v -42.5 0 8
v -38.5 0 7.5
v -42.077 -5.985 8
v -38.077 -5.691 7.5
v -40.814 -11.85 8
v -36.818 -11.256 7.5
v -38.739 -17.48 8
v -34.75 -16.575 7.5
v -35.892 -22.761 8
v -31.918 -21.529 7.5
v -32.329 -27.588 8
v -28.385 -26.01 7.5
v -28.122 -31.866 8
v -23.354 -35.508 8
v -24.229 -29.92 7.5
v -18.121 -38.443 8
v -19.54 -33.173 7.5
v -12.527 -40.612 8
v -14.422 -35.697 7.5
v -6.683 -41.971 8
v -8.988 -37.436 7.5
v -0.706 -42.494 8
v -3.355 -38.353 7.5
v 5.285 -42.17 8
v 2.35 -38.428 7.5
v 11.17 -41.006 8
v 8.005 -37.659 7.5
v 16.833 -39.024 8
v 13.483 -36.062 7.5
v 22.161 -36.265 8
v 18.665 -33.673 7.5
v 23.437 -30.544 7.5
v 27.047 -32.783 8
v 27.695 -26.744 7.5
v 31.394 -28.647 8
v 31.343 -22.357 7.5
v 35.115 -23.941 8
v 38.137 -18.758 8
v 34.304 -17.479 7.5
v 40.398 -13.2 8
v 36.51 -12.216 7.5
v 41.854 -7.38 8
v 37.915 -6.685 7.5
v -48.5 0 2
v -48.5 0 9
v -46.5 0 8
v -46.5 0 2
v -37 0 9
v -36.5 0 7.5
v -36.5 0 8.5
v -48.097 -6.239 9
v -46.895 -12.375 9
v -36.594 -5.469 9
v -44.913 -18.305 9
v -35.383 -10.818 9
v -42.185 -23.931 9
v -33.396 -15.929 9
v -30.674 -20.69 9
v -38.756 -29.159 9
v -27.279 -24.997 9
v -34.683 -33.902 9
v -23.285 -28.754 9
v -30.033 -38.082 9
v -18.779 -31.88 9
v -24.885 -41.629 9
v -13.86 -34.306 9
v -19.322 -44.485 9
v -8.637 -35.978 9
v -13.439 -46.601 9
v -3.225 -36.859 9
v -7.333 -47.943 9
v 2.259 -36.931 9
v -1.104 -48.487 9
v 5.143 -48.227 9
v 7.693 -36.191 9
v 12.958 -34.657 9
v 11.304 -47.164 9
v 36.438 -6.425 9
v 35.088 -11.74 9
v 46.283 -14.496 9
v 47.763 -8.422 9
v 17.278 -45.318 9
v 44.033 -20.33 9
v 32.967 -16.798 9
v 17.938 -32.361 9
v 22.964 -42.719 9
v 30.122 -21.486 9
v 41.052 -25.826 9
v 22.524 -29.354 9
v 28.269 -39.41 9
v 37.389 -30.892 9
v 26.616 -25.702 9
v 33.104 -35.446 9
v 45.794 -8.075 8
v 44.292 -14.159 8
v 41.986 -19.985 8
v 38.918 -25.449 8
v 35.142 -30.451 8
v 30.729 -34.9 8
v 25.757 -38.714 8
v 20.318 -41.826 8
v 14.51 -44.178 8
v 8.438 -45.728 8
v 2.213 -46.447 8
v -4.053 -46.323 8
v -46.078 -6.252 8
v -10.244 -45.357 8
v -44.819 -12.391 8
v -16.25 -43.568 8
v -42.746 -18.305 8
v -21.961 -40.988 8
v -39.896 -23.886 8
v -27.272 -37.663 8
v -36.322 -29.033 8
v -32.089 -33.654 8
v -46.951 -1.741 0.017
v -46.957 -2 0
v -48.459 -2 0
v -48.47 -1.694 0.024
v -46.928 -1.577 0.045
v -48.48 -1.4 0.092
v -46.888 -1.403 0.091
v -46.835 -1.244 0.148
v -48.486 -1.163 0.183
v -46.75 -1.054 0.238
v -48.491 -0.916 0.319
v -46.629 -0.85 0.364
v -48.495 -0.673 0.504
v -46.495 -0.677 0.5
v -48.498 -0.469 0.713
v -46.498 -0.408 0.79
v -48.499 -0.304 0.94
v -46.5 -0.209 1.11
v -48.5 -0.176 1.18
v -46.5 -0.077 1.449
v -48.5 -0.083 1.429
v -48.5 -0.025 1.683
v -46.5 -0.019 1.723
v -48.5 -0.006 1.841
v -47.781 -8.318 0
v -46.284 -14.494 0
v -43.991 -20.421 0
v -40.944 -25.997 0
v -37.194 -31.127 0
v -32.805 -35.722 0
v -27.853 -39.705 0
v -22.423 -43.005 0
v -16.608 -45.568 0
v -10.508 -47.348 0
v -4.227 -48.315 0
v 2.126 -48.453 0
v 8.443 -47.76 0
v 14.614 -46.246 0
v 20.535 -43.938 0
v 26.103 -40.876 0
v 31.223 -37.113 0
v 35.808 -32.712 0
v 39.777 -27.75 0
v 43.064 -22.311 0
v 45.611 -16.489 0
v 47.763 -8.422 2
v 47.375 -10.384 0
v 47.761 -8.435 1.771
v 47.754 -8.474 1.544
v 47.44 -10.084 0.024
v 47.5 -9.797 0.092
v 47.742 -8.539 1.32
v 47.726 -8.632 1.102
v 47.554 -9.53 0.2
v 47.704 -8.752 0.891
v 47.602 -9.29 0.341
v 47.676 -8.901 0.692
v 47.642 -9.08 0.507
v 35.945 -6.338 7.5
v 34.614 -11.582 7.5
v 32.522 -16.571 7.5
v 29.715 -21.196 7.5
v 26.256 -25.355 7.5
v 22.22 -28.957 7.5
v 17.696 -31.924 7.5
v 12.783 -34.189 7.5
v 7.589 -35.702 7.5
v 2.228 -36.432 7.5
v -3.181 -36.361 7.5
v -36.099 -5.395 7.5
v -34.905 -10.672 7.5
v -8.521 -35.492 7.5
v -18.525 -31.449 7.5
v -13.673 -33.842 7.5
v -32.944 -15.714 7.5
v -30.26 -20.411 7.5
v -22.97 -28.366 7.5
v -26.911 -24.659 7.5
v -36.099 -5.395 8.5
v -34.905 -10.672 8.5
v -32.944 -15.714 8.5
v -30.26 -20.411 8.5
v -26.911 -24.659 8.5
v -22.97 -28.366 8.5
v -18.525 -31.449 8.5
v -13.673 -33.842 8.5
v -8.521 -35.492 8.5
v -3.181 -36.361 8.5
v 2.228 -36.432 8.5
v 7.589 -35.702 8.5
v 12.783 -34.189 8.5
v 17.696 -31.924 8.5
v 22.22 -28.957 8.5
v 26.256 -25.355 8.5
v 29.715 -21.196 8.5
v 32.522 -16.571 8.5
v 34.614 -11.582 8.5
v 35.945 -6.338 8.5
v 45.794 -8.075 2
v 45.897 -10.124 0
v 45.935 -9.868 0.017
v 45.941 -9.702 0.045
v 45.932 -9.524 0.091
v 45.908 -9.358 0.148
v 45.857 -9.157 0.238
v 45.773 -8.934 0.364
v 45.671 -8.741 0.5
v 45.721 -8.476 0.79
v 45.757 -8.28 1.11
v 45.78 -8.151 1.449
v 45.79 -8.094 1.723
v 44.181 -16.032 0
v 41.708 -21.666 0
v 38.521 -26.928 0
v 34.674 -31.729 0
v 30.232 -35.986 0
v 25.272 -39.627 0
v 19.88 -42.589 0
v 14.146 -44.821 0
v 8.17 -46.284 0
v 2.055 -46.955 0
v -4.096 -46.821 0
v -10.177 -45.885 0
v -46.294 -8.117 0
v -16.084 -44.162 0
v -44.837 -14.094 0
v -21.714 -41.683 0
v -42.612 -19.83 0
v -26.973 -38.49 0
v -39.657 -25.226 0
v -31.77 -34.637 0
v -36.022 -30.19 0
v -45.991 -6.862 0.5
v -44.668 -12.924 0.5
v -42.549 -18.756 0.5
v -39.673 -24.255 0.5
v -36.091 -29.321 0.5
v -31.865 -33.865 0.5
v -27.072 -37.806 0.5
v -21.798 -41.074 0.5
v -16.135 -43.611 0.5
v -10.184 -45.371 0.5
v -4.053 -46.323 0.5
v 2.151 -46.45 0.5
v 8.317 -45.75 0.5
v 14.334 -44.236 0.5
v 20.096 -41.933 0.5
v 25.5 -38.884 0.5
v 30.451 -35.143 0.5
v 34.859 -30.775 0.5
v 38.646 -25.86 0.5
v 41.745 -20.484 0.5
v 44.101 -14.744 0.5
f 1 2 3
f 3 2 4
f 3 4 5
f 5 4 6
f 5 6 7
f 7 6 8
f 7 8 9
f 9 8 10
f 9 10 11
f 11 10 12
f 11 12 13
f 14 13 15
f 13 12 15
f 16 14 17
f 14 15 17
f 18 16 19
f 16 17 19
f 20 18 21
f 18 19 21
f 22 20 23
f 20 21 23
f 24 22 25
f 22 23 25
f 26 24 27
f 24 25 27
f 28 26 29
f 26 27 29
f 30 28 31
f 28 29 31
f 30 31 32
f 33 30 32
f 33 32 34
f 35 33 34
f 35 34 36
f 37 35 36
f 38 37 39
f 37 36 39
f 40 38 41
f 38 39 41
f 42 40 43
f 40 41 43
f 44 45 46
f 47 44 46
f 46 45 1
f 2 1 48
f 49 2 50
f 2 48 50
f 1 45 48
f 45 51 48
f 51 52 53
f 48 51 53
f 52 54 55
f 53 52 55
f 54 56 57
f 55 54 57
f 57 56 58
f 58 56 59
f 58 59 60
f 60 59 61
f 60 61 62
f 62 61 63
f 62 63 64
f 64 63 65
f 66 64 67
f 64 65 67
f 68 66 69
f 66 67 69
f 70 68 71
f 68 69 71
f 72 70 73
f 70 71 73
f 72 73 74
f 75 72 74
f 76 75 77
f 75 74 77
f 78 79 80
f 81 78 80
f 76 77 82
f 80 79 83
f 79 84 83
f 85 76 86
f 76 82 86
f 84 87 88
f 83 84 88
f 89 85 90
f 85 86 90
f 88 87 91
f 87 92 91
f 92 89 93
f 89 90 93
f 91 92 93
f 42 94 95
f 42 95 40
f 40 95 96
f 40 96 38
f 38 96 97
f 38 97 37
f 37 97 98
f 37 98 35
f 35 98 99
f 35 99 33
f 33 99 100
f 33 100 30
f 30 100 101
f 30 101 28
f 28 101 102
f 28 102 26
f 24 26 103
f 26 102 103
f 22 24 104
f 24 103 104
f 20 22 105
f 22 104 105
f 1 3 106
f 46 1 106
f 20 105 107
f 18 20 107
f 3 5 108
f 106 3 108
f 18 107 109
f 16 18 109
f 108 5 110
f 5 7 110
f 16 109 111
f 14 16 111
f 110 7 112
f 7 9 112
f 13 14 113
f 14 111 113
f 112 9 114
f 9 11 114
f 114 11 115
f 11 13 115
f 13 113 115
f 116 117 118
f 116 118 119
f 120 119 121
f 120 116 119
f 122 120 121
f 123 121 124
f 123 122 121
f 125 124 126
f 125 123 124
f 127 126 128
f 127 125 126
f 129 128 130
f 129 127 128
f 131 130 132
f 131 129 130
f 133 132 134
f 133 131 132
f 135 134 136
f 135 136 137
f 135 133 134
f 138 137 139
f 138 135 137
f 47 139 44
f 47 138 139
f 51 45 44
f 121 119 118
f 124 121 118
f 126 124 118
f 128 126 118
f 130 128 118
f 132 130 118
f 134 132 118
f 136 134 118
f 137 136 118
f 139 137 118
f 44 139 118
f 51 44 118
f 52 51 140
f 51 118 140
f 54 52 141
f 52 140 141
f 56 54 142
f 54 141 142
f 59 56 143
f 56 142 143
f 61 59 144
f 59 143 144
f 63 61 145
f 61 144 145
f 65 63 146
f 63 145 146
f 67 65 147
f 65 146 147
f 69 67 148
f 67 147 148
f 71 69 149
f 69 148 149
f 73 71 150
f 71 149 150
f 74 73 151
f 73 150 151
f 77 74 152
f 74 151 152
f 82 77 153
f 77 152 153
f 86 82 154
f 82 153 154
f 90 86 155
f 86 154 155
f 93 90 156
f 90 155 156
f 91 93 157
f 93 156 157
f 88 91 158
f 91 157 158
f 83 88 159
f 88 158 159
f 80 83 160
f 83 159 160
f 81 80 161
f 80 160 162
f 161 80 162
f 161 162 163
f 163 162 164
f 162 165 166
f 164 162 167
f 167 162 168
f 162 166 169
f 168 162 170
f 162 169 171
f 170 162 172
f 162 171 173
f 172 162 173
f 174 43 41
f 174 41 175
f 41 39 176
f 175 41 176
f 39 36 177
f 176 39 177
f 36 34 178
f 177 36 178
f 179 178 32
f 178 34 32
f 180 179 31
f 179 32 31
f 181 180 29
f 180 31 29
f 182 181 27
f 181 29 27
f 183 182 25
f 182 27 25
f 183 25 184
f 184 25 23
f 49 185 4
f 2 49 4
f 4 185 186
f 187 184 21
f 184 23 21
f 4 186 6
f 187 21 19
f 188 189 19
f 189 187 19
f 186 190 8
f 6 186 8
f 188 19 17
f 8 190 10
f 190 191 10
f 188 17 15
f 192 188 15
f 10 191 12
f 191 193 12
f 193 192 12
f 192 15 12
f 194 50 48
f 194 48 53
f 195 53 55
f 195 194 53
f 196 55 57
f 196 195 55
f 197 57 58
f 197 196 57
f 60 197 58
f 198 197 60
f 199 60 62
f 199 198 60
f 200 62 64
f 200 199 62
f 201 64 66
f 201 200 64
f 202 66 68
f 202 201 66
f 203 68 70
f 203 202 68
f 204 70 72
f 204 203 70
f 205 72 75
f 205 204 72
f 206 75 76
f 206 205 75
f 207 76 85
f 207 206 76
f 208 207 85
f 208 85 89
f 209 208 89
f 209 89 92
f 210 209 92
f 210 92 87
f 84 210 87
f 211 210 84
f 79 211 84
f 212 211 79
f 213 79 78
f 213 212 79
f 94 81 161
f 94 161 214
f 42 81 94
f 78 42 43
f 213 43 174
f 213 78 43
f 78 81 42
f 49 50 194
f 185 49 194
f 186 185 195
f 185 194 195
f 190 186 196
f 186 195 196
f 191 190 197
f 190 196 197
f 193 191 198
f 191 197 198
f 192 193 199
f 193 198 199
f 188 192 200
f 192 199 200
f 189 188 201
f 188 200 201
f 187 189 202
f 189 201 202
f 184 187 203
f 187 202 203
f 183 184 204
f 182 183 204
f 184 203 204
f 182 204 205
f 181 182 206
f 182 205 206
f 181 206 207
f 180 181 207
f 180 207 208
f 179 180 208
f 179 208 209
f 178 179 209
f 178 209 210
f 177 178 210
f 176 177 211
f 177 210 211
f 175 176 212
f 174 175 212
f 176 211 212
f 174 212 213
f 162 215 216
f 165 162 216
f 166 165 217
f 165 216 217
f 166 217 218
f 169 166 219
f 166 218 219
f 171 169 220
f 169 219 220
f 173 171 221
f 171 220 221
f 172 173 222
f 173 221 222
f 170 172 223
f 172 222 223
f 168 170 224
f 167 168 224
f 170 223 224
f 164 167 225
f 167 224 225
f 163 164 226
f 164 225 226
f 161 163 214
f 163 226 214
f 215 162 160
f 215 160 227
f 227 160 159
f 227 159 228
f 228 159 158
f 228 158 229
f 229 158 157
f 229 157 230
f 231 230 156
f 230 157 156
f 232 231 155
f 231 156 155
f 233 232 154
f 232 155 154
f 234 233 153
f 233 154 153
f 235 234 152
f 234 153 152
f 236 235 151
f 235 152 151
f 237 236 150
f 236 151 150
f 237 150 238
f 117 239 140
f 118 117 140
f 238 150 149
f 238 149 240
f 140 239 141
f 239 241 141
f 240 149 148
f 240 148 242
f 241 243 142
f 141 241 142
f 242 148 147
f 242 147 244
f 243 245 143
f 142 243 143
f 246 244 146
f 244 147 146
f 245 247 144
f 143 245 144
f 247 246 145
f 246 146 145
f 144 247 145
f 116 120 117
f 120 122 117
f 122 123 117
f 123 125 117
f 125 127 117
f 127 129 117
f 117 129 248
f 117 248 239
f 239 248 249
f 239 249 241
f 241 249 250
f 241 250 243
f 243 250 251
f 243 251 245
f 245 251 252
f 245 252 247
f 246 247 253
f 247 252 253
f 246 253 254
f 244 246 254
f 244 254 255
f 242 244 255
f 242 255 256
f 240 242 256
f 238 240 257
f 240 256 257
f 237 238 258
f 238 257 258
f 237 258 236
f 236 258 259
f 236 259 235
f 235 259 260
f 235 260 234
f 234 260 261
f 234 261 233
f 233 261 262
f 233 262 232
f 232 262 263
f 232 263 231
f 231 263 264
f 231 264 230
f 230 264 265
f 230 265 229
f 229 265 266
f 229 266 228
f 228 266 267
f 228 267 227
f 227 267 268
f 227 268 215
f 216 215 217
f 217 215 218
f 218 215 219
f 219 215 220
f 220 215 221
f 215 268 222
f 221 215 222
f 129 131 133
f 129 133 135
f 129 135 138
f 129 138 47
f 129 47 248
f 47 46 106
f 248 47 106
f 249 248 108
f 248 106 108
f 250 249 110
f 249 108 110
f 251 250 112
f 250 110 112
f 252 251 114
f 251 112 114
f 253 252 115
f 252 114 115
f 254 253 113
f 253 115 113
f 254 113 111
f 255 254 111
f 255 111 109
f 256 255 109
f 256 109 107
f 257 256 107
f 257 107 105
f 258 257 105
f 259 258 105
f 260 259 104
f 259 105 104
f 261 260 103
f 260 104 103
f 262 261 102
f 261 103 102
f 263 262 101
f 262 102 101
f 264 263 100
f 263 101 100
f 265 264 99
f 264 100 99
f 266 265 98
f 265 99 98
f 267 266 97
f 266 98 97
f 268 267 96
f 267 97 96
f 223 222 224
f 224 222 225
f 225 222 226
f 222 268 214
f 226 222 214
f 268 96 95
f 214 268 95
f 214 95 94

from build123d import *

# Parameters (mm, degrees)
F1_ANGLE = 170
F2_SIZE  = 0.5
F3_R     = 2
F4_SIZE  = 0.5


# Not quite as in the source:
# - a feature names something its author has since deleted; it is built from what else it names


with BuildPart() as f1:
    # F0 (on Front) → F1 (revolve)
    with BuildSketch(Plane.XZ):
        Polygon((-48.5, 9), (-48.5, 0), (-46.5, 0), (-46.5, 8), (-42.5, 8), (-38.5, 7.5), (-36.5, 7.5), (-36.5, 9), align=None)
    revolve(axis=Axis((0, 0, 4.2486875318), (0, 0, 1)), revolution_arc=F1_ANGLE)

    # F2
    f2_edges = [f1.edges().sort_by_distance(p)[0] for p in [
        (-4.052742, -46.323053, 0),
    ]]
    chamfer(f2_edges, length=F2_SIZE)

    # F3
    f3_edges = [f1.edges().sort_by_distance(p)[0] for p in [
        (47.02457, -8.2917, 0),
        (-47.75, 0, 0),
    ]]
    fillet(f3_edges, radius=F3_R)

    # F4
    f4_edges = [f1.edges().sort_by_distance(p)[0] for p in [
        (-3.181185, -36.361106, 9),
    ]]
    chamfer(f4_edges, length=F4_SIZE)


solid = f1.part
